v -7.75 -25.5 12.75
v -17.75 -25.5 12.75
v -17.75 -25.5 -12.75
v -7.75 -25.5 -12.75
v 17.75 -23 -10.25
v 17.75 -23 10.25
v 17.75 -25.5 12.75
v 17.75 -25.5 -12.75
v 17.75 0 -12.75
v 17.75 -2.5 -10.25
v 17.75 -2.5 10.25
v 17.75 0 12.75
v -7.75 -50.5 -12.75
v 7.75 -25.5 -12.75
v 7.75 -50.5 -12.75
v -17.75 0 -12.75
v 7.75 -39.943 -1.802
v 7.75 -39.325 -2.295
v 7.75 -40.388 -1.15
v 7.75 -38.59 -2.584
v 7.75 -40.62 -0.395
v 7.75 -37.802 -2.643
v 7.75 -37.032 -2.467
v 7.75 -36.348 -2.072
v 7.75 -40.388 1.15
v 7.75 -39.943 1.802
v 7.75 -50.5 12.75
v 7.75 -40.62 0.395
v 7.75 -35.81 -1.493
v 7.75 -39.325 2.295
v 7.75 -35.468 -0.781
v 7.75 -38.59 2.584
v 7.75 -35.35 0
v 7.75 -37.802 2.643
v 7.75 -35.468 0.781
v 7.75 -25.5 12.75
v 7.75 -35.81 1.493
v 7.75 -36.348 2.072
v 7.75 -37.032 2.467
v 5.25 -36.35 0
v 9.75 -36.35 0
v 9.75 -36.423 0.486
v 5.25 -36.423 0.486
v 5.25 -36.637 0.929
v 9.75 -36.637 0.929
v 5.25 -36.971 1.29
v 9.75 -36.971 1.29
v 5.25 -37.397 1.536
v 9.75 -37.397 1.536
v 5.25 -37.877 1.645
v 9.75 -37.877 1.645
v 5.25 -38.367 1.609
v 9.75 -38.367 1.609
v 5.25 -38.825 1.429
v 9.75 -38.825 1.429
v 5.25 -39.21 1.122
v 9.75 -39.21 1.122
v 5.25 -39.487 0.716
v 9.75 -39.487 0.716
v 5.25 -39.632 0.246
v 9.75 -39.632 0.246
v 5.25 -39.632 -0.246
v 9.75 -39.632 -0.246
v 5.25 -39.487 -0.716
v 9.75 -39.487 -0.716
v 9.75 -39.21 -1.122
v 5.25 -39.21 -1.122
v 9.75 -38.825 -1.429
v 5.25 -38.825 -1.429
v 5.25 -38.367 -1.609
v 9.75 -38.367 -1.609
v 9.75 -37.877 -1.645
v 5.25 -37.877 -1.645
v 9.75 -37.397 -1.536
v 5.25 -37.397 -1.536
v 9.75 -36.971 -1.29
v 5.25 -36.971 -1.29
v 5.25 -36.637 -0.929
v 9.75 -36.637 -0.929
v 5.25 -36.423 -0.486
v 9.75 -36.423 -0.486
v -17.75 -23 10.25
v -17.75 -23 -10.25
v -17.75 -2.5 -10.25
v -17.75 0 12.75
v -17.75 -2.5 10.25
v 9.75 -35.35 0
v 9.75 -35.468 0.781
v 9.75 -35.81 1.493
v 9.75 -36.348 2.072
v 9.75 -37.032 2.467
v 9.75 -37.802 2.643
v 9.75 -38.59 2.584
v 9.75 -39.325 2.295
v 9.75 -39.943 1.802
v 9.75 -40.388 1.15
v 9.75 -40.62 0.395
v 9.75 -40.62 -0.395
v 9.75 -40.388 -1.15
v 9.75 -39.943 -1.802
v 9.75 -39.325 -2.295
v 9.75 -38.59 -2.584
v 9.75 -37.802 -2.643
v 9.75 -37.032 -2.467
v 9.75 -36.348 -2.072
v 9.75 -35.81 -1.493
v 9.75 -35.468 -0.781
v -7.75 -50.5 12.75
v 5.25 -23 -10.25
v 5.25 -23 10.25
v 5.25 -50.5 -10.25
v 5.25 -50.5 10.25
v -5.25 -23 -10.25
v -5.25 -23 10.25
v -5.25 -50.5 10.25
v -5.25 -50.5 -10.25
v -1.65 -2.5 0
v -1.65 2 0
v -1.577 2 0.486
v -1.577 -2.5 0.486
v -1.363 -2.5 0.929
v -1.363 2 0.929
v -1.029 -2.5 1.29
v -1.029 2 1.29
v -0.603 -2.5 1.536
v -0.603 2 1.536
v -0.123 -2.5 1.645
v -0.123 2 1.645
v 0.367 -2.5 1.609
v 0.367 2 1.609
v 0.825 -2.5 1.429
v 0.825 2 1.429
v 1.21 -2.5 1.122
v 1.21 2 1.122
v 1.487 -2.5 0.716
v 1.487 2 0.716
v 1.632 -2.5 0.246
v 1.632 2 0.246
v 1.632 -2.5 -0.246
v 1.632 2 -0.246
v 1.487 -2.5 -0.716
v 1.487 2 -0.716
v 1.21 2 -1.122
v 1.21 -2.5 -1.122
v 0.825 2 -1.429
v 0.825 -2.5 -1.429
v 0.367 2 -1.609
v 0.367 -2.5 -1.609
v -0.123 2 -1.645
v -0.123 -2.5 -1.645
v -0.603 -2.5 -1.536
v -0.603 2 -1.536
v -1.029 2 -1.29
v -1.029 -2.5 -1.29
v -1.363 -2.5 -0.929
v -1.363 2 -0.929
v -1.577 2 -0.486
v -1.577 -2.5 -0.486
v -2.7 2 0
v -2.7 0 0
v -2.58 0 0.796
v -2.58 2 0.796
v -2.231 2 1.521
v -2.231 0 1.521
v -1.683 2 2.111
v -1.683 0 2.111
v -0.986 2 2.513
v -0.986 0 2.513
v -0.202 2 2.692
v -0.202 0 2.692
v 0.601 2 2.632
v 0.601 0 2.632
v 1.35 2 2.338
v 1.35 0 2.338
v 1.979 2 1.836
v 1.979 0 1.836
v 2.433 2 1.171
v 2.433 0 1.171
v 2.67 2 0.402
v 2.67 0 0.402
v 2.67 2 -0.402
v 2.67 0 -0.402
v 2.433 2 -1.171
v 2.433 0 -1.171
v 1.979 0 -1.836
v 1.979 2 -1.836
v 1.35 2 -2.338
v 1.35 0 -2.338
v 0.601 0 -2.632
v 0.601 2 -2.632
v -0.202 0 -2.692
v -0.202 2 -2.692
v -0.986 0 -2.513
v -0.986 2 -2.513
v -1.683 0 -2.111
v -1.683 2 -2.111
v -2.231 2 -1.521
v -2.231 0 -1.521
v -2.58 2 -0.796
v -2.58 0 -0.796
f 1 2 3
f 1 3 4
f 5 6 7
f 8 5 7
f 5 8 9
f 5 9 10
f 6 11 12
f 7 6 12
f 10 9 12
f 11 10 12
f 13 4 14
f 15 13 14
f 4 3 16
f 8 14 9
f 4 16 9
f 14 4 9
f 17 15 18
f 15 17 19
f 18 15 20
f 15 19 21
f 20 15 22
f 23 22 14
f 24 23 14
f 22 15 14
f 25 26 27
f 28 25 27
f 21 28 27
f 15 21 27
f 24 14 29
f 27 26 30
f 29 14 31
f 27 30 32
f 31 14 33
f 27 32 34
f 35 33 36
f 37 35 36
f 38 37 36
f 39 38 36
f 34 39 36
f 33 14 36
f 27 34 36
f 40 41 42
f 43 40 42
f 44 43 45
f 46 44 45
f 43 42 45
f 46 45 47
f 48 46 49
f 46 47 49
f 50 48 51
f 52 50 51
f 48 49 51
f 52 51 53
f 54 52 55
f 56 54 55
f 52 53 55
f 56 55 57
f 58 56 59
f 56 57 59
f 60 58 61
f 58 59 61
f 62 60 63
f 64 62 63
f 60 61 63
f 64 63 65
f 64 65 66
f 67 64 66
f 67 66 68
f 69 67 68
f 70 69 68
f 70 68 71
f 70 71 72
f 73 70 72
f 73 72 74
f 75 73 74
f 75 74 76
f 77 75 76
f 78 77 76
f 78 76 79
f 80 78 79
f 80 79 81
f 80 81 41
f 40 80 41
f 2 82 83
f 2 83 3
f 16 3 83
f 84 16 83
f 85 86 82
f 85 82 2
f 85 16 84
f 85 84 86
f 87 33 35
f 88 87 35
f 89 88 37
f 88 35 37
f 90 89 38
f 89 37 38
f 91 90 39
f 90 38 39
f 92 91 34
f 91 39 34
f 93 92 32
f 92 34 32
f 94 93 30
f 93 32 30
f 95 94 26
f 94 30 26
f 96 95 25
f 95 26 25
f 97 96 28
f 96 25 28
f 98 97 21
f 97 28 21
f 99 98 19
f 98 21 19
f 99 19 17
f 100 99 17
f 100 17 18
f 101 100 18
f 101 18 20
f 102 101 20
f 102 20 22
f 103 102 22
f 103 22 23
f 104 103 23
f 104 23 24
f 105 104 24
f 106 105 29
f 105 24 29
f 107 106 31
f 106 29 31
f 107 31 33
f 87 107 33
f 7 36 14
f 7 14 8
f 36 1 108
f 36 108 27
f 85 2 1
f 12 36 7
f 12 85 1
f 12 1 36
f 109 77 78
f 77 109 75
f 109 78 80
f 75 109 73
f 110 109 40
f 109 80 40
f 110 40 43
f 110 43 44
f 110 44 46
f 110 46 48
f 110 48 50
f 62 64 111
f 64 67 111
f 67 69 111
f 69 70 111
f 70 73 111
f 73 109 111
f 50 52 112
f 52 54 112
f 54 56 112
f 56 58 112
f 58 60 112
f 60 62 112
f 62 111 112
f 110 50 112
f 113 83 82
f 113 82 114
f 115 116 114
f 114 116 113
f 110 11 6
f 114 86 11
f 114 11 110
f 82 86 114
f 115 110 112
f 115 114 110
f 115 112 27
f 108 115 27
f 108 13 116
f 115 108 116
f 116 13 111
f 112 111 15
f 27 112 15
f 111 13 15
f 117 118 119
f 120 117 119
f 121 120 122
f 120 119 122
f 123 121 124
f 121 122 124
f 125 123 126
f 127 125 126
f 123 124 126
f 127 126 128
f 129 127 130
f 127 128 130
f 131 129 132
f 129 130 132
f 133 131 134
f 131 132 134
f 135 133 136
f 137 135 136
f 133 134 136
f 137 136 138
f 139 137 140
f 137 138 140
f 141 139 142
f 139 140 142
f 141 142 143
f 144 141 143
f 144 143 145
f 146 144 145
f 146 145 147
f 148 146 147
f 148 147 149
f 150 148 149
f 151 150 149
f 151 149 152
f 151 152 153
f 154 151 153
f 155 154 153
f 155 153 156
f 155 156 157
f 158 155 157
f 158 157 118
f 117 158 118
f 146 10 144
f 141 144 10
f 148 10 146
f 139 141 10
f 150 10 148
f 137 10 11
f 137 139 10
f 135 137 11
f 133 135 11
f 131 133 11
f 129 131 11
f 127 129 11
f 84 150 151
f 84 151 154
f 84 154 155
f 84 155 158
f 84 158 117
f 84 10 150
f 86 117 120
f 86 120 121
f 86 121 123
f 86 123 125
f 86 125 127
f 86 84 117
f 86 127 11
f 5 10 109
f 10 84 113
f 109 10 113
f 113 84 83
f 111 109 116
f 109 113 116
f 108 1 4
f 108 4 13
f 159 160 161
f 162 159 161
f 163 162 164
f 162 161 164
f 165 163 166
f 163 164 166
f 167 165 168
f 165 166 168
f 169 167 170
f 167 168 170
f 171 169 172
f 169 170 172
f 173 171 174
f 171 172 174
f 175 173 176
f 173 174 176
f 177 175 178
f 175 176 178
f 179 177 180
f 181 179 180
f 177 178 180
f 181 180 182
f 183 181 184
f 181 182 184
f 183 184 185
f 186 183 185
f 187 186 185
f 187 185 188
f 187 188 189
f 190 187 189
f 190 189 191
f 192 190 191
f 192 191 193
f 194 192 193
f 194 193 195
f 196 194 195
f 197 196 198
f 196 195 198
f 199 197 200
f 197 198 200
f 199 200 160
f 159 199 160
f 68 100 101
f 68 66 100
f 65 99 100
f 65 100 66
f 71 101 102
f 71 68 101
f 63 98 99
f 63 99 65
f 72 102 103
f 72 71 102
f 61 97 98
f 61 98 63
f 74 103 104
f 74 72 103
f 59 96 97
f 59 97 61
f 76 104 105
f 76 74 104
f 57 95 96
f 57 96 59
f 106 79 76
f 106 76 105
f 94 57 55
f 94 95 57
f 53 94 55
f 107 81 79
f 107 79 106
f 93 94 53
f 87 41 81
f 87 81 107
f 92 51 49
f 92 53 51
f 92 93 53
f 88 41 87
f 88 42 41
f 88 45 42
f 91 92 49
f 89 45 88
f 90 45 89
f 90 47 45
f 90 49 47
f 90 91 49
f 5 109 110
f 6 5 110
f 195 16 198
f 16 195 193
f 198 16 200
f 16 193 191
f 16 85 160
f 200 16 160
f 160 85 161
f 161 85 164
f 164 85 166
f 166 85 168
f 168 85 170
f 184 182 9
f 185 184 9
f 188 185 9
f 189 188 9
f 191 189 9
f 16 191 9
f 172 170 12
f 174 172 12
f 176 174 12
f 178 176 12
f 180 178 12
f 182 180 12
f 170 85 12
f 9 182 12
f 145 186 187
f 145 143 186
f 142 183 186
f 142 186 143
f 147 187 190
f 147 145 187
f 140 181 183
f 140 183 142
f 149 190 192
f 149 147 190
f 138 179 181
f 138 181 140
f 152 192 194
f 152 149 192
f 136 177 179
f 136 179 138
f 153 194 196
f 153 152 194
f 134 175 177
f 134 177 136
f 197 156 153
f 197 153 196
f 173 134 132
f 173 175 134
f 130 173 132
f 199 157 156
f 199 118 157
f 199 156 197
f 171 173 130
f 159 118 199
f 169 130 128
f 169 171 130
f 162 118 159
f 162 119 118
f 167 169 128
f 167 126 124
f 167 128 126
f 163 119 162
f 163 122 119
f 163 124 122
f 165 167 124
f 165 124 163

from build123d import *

# Parameters (mm, degrees)
F0_W      = 35.5
F0_H      = 25.5
F1_DEPTH  = 25.5
F2_W      = 20.5
F2_H      = 20.5
F3_DEPTH  = 35.5
F4_W      = 15.5
F4_H      = 25.5
F5_DEPTH  = 25
F6_W      = 20.5
F6_H      = 20.5
F7_DEPTH  = 38
F8_R      = 2.65
F9_DEPTH  = 2
F10_R     = 1.65
F11_DEPTH = 27.501
F12_R     = 2.7
F13_DEPTH = 2
F14_R     = 1.65
F15_DEPTH = 5.5
F16_W     = 2.5
F16_H     = 25
F17_DEPTH = 20.5
F18_W     = 20
F18_H     = 20.5
F19_DEPTH = 2.5
F20_W     = 2.5
F20_H     = 2.5
F21_DEPTH = 20.5
F22_W     = 7.5
F22_H     = 20.5
F23_DEPTH = 2.5
F24_W     = 10
F24_H     = 20.5
F25_DEPTH = 2.5
F26_W     = 10
F26_H     = 20.5
F27_DEPTH = 2.5
F28_W     = 9
F28_H     = 20.5
F28_W_2   = 8.5
F29_DEPTH = 2.5


with BuildPart() as f1:
    # F0 (on Front) → F1 (new body)
    with BuildSketch(Plane.XZ):
        Rectangle(F0_W, F0_H)
    extrude(amount=F1_DEPTH)

    # F2 (on face) → F3 (cut)
    with BuildSketch(Plane(origin=(-17.75, 0, 0), x_dir=(0, -1, 0), z_dir=(-1, 0, 0))):
        with Locations((12.75, 0)):
            Rectangle(F2_W, F2_H)
    extrude(amount=-F3_DEPTH, mode=Mode.SUBTRACT)

    # F4 (on face) → F5 (join)
    with BuildSketch(Plane.XZ.offset(25.5)):
        Rectangle(F4_W, F4_H)
    extrude(amount=F5_DEPTH)

    # F6 (on face) → F7 (cut)
    with BuildSketch(Plane.XZ.offset(50.5)):
        with Locations((-5, 0)):
            Rectangle(F6_W, F6_H)
    extrude(amount=-F7_DEPTH, mode=Mode.SUBTRACT)

    # F8 (on face) → F9 (join)
    with BuildSketch(Plane.YZ.offset(7.75)):
        with Locations((-38, 0)):
            Circle(F8_R)
    extrude(amount=F9_DEPTH)

    # F10 (on face) → F11 (cut, through all)
    with BuildSketch(Plane.YZ.offset(9.75)):
        with Locations((-38, 0)):
            Circle(F10_R)
    extrude(amount=-F11_DEPTH, mode=Mode.SUBTRACT)

    # F12 (on face) → F13 (join)
    with BuildSketch(Plane(origin=(0, 0, 0), x_dir=(-1, 0, 0), z_dir=(0, 1, 0))):
        Circle(F12_R)
    extrude(amount=F13_DEPTH)

    # F14 (on face) → F15 (cut)
    with BuildSketch(Plane(origin=(0, 2, 0), x_dir=(-1, 0, 0), z_dir=(0, 1, 0))):
        Circle(F14_R)
    extrude(amount=-F15_DEPTH, mode=Mode.SUBTRACT)

    # F16 (on face) → F17 (join)
    with BuildSketch(Plane.XY.offset(-10.25)):
        with Locations((-6.5, -38)):
            Rectangle(F16_W, F16_H)
    extrude(amount=F17_DEPTH)

    # F18 (on face) → F19 (cut)
    with BuildSketch(Plane(origin=(-7.75, 0, 0), x_dir=(0, -1, 0), z_dir=(-1, 0, 0))):
        with Locations((38, 0)):
            Rectangle(F18_W, F18_H)
    extrude(amount=-F19_DEPTH, mode=Mode.SUBTRACT)

    # F20 (on face) → F21 (join)
    with BuildSketch(Plane.XY.offset(-10.25)):
        with Locations((-6.5, -38.25)):
            Rectangle(F20_W, F20_H)
    extrude(amount=F21_DEPTH)

    # F22 (on face) → F23 (cut)
    with BuildSketch(Plane.XZ.offset(25.5)):
        with Locations((11.5, 0)):
            Rectangle(F22_W, F22_H)
    extrude(amount=-F23_DEPTH, mode=Mode.SUBTRACT)

    # F24 (on face) → F25 (join)
    with BuildSketch(Plane.XZ.offset(25.5)):
        with Locations((-10.25, 0)):
            Rectangle(F24_W, F24_H)
    extrude(amount=-F25_DEPTH)

    # F26 (on face) → F27 (join)
    with BuildSketch(Plane.XZ.offset(25.5)):
        with Locations((10.25, 0)):
            Rectangle(F26_W, F26_H)
    extrude(amount=-F27_DEPTH)

    # F28 (on face) → F29 (join)
    with BuildSketch(Plane(origin=(-7.75, 0, 0), x_dir=(0, -1, 0), z_dir=(-1, 0, 0))):
        with Locations((32.5, 0)):
            Rectangle(F28_W, F28_H)
        with Locations((43.75, 0)):
            Rectangle(F28_W_2, F28_H)
    extrude(amount=-F29_DEPTH)


solid = f1.part
